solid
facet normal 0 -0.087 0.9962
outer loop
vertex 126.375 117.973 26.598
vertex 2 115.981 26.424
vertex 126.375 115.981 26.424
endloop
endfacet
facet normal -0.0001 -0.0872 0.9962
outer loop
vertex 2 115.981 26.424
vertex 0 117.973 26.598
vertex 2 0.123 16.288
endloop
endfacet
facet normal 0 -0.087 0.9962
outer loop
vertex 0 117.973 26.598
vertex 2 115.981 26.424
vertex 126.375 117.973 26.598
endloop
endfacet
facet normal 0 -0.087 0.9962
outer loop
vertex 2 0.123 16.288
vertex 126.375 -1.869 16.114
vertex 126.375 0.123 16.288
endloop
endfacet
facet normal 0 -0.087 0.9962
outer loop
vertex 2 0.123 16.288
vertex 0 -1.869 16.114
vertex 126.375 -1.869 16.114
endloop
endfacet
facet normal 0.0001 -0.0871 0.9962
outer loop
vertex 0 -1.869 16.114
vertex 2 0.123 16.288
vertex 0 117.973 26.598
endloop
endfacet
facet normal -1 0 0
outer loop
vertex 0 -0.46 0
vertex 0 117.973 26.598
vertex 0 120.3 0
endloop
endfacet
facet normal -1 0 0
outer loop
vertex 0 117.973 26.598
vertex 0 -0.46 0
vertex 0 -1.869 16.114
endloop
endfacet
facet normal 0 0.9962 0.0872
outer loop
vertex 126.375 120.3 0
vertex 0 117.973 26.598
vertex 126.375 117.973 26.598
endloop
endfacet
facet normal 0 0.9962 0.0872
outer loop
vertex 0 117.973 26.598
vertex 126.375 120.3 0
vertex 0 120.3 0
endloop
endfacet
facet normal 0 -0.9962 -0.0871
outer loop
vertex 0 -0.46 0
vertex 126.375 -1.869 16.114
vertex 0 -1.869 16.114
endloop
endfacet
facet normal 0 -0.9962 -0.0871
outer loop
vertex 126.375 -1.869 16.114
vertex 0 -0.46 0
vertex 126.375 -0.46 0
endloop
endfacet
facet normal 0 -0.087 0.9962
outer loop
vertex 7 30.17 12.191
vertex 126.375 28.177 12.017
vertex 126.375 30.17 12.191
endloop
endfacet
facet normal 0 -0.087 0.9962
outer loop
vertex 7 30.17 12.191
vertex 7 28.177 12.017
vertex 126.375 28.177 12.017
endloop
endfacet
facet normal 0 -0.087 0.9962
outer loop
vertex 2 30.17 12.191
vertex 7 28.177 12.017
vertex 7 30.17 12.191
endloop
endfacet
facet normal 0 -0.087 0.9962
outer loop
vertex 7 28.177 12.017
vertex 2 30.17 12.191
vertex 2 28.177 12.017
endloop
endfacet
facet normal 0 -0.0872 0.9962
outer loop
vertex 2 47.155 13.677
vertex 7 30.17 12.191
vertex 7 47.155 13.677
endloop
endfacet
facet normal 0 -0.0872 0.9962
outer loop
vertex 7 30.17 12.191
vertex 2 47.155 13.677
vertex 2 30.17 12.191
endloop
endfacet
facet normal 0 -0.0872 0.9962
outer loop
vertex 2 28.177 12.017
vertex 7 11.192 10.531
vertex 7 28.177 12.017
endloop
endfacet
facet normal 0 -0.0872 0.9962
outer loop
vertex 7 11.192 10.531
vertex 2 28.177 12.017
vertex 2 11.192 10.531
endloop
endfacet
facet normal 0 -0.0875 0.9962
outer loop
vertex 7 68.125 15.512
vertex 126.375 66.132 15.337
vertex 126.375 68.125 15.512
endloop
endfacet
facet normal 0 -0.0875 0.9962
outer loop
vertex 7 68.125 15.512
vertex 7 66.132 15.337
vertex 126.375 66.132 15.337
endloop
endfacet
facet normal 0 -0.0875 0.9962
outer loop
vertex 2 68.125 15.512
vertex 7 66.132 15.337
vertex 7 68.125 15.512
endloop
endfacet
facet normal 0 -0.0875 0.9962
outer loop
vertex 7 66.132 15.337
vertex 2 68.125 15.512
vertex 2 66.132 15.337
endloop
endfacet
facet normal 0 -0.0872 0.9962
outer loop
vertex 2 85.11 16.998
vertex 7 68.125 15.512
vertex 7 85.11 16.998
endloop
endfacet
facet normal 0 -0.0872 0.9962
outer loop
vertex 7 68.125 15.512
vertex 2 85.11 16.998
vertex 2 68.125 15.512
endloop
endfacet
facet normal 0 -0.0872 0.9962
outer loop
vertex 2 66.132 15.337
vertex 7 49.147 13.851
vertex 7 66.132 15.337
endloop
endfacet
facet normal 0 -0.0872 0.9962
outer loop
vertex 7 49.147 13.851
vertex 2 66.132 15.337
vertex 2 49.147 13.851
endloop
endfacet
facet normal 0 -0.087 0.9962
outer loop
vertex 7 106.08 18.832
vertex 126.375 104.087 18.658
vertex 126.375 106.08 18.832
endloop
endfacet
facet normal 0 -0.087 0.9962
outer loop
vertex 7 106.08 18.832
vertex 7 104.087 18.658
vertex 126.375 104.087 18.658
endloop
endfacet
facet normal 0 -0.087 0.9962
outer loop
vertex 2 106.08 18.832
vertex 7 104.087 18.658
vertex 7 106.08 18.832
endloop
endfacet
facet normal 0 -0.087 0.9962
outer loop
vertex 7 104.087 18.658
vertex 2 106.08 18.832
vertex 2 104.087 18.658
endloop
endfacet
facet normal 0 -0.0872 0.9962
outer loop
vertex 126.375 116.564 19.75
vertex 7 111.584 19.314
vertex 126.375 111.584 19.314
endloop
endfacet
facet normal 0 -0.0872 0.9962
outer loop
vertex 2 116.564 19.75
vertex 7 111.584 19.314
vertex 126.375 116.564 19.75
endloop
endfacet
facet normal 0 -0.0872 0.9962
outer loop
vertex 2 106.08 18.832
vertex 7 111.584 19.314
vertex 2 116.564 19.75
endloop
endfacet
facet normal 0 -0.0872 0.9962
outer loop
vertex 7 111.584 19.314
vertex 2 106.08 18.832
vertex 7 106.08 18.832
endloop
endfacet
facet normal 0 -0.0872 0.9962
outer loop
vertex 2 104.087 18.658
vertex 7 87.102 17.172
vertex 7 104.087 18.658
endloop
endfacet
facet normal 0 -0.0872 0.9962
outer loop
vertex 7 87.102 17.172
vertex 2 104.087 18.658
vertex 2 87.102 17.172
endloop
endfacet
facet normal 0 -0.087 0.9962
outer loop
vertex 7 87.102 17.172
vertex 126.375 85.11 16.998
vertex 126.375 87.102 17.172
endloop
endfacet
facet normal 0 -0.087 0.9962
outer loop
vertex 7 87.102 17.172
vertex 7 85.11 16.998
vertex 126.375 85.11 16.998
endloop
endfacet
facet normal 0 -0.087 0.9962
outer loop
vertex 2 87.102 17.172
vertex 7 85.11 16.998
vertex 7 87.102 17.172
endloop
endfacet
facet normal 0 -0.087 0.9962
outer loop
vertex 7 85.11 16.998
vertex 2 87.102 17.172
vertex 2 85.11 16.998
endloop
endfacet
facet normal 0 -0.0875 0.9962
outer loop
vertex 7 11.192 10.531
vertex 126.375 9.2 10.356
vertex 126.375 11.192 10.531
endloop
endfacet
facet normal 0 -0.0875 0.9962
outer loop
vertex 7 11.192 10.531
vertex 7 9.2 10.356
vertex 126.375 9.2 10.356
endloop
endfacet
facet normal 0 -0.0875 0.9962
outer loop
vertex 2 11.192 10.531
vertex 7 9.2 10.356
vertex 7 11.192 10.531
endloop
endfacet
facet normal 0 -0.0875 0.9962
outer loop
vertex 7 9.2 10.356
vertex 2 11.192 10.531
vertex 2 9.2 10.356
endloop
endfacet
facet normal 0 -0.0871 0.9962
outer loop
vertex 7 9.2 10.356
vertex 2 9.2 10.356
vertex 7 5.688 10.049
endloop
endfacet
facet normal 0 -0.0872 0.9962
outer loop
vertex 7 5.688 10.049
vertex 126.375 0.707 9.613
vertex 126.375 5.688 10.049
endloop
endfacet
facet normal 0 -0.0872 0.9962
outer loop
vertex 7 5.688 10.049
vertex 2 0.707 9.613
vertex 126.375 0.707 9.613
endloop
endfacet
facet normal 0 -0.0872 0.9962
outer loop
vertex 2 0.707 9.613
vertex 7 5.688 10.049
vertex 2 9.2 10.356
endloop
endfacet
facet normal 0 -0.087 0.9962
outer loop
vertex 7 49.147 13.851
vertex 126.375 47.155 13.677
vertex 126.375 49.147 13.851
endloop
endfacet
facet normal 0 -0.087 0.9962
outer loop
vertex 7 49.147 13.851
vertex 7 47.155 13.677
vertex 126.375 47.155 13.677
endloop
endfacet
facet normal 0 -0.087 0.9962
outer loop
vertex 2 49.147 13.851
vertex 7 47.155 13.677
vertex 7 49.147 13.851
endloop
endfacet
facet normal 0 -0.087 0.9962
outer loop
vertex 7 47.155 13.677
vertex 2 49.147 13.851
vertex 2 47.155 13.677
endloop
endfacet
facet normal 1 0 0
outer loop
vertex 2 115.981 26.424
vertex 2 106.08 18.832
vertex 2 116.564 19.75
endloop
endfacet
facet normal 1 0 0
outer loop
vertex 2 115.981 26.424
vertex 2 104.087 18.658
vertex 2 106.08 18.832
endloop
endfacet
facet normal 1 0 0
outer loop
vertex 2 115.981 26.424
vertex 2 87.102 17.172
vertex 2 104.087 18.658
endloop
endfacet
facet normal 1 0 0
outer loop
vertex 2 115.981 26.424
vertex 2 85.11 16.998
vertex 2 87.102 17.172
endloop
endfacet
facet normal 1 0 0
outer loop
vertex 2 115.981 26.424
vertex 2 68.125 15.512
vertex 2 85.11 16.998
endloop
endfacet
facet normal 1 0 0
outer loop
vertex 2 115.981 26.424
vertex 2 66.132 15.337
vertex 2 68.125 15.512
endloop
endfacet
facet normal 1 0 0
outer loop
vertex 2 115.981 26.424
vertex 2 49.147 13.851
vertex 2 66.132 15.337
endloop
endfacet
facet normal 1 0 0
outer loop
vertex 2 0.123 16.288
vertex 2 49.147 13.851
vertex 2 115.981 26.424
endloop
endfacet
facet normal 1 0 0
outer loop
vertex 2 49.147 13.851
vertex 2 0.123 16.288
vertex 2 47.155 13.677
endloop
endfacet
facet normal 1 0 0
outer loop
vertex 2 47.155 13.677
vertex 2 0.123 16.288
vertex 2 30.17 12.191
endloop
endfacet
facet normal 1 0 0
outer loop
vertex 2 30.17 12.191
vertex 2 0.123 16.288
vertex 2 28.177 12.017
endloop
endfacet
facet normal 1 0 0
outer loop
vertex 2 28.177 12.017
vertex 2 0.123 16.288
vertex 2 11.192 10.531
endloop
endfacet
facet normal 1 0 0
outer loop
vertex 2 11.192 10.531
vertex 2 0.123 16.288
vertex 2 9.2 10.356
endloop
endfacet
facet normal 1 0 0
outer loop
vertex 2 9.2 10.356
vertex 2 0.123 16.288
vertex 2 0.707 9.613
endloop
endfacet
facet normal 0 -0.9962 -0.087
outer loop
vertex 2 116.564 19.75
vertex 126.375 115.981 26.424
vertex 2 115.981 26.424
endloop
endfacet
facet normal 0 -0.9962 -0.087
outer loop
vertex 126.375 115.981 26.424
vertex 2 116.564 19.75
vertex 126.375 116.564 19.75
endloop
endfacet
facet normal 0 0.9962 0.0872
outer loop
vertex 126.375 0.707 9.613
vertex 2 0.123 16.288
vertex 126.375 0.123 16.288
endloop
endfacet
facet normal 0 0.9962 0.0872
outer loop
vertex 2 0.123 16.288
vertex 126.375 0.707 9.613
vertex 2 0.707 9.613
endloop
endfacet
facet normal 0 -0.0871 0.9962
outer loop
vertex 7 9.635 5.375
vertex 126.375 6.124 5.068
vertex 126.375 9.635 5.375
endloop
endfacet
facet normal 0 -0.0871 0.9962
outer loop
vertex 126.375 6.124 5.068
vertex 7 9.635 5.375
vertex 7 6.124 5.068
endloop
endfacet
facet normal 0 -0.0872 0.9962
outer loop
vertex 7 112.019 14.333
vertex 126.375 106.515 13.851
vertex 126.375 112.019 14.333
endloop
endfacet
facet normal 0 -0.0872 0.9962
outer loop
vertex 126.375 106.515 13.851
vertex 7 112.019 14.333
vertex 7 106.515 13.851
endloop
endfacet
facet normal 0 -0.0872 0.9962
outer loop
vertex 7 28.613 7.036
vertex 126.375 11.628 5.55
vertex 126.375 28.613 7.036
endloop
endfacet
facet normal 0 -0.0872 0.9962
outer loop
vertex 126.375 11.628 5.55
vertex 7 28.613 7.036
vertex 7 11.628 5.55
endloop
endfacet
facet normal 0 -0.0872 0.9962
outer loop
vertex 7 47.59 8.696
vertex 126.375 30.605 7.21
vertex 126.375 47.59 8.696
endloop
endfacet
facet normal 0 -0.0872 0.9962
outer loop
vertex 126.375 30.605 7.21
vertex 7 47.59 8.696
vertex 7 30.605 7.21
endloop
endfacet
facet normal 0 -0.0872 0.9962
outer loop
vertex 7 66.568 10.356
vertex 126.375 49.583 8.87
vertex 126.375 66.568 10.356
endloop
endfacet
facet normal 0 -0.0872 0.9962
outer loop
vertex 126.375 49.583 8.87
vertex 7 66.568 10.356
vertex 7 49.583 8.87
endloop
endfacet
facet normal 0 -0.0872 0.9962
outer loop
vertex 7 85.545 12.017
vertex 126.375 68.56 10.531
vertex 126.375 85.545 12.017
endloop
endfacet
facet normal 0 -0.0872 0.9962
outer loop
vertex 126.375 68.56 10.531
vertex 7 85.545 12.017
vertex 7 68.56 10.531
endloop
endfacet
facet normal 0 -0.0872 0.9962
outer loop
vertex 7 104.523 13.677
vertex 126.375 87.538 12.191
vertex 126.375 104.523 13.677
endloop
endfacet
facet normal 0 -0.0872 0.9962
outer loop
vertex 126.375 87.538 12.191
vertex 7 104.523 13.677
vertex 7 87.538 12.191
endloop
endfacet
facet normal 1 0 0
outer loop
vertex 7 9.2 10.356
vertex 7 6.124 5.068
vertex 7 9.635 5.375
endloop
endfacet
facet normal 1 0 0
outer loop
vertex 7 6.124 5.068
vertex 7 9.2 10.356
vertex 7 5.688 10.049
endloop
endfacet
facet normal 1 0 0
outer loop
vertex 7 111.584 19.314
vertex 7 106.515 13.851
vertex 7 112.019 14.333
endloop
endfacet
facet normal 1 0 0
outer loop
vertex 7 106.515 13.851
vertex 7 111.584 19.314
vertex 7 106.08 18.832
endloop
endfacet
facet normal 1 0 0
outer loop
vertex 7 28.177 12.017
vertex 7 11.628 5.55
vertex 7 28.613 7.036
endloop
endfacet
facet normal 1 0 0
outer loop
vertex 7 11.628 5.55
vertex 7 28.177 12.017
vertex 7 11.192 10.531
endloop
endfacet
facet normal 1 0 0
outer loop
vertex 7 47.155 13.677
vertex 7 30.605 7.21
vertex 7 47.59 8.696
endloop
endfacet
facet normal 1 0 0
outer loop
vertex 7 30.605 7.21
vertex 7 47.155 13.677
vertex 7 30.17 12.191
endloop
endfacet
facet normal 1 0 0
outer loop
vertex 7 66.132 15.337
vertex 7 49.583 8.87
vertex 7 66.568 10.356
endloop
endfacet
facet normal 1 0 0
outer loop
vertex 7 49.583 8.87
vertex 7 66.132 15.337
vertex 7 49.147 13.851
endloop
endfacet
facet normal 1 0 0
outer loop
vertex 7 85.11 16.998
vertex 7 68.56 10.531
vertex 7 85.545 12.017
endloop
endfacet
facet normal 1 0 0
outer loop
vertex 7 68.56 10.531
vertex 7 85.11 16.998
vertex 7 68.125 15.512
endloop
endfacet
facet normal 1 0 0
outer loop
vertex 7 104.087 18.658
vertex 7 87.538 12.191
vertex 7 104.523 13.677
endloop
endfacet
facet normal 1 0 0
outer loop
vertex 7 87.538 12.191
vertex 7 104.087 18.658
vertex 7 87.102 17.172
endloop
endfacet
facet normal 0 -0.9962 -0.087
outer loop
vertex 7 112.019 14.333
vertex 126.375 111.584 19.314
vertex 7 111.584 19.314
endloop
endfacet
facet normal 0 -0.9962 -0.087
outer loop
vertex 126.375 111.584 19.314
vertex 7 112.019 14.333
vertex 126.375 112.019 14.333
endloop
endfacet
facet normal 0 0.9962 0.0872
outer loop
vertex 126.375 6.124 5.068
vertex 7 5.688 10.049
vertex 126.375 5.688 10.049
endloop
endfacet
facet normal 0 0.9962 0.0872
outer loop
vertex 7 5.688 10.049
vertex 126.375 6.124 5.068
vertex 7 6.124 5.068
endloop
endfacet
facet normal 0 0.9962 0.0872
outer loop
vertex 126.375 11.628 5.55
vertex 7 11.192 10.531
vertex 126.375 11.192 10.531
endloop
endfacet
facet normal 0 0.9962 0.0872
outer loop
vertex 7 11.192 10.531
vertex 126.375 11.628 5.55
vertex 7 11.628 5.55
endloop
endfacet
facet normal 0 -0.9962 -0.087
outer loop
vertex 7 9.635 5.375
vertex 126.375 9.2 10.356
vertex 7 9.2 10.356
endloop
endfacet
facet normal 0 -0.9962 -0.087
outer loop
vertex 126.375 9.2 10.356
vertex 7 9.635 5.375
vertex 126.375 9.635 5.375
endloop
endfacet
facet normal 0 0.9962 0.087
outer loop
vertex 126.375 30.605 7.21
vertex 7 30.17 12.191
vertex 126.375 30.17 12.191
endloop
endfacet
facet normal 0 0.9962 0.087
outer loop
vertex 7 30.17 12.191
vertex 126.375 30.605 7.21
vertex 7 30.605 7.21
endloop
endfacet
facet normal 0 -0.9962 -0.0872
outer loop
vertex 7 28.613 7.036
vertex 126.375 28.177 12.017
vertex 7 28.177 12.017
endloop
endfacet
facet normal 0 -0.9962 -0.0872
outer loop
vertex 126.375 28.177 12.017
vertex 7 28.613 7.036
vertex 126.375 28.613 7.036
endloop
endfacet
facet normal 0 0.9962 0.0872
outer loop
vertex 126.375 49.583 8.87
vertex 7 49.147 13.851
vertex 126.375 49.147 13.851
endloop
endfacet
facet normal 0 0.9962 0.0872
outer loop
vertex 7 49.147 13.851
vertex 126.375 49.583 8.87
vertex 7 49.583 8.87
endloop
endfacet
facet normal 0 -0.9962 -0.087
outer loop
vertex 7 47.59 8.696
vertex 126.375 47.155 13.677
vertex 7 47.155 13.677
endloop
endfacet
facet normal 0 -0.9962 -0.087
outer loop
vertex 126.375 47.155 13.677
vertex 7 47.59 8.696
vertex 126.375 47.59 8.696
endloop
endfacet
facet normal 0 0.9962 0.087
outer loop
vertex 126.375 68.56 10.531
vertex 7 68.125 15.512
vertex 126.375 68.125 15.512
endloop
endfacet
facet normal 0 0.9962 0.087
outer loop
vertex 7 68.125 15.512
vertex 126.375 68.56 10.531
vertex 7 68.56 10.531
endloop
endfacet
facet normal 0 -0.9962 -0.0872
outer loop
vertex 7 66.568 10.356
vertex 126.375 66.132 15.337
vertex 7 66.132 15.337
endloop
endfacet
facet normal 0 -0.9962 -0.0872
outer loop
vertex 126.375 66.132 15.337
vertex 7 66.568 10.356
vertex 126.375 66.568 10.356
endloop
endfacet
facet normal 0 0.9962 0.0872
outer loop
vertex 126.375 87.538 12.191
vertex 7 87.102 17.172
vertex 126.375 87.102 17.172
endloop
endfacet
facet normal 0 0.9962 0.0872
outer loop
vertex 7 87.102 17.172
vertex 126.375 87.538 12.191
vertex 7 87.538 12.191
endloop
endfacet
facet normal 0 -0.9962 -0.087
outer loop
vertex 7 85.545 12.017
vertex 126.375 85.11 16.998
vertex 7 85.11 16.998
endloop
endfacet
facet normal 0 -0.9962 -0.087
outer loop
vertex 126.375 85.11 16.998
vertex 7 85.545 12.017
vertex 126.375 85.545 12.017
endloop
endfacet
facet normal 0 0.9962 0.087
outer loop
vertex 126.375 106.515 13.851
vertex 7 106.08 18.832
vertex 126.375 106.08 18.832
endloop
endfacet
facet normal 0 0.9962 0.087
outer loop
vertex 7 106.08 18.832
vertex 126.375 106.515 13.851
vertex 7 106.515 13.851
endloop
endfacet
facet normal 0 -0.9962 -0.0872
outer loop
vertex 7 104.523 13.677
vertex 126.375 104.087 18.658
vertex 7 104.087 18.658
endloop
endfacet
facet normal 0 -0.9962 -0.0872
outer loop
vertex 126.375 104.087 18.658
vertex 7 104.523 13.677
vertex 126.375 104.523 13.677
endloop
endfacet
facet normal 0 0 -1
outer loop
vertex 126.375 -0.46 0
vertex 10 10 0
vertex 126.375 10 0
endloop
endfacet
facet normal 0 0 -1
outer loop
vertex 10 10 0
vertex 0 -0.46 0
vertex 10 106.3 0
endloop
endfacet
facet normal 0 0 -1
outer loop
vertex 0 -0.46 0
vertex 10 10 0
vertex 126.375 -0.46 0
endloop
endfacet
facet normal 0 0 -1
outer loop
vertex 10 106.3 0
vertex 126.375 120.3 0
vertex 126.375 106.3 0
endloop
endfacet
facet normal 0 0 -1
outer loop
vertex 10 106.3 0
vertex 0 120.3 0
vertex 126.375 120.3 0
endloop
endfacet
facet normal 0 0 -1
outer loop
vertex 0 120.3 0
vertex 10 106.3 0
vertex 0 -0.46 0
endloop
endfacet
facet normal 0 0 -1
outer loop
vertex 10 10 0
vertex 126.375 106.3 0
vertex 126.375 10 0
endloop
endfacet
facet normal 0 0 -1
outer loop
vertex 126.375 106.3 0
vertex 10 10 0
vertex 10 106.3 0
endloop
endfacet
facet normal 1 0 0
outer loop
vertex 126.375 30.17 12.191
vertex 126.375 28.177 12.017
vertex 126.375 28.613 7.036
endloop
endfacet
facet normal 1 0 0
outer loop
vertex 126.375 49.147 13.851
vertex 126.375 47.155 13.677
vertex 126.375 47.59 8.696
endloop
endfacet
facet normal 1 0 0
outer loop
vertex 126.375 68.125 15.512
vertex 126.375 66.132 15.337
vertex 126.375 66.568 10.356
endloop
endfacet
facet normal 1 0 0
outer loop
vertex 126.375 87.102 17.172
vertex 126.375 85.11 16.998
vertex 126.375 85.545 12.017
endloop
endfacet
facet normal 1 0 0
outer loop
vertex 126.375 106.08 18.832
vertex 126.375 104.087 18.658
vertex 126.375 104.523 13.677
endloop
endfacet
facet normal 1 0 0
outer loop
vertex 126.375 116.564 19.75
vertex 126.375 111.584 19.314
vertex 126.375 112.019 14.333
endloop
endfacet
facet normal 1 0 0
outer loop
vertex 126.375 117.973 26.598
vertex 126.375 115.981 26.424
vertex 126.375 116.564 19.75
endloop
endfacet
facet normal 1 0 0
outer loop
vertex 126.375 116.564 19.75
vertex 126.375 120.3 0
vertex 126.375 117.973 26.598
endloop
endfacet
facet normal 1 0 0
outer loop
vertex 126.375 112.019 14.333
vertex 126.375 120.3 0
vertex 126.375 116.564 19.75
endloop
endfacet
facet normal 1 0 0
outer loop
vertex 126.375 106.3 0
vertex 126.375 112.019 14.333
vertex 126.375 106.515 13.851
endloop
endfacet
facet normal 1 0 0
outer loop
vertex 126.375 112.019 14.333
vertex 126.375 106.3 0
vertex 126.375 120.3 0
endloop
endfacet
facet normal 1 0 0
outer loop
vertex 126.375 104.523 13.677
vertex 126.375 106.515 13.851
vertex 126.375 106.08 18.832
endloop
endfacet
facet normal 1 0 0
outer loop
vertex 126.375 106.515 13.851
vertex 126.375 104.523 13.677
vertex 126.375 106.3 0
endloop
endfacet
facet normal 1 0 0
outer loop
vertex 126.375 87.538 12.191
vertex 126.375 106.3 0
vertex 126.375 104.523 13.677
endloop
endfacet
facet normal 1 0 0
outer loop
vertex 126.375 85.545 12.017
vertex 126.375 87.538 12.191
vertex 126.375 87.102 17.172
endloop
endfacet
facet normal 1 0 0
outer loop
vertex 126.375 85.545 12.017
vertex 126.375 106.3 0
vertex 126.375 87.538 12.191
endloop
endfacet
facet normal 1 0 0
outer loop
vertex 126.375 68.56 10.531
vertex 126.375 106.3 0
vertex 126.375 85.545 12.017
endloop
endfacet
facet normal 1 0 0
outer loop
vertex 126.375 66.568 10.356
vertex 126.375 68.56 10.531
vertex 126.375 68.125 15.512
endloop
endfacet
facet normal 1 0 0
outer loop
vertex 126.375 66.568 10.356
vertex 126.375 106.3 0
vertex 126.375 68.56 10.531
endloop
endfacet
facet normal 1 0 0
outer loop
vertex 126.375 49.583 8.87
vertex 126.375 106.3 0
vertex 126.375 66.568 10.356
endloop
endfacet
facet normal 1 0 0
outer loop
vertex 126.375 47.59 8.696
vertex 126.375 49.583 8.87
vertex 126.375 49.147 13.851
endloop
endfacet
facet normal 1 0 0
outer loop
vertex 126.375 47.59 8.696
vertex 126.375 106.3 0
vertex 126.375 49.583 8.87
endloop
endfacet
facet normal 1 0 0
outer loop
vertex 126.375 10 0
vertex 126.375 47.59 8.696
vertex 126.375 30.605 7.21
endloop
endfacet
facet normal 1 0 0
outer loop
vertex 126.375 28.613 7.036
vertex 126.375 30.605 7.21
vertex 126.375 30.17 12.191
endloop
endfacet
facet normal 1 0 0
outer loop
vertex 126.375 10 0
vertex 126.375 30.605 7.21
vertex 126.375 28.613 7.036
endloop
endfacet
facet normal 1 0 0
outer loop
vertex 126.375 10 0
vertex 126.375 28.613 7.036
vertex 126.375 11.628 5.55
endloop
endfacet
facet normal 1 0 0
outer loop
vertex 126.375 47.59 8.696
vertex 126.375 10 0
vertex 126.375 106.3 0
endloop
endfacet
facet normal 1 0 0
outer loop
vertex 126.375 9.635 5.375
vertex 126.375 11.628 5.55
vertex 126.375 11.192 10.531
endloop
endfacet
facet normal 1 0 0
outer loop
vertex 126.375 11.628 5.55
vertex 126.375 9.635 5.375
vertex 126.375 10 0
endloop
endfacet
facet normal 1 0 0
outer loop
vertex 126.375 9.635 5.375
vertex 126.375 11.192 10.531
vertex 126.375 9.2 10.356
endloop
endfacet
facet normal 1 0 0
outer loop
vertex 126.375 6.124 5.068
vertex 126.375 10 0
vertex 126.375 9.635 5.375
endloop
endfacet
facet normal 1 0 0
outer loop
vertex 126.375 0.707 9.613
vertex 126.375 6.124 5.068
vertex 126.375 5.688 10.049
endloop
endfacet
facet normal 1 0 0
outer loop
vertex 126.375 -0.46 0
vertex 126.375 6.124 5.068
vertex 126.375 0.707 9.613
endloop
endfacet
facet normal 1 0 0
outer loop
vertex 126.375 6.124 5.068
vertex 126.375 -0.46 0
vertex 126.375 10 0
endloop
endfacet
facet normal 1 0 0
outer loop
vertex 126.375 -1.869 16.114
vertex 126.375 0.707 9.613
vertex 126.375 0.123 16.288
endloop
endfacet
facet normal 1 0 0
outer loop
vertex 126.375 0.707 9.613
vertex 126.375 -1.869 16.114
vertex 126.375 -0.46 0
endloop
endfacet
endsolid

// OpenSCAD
pcb_width = 287.75; // 185.750 mm (Set a bit larger than real PCB size.)
pcb_height = 116.3; // 114.300 mm
exact_pcb_height = 114.300;
pcb_depth = 1.7; // 1.6 mm
pcb_edge_case_thickness = 2;
pcb_edge_support_thickness = 5;
pcb_buttom_gap = 5;
cherry_mx_plate_distance = 5;
pcb_hole_depth = pcb_depth + cherry_mx_plate_distance;
support_cube_thickness = 2;
support_line_locations = [for (i = [1, 3, 5, 7, 9, 11]) exact_pcb_height / 12 * i];
arduino_center_location_x = pcb_width / 2;
arduino_width = 23; // 18.37 mm
arduino_height = 57; // 57 mm (including area between top of arduino and pcb edge, and area having 2 diodes just under arduino that collide with a support line)
arduino_depth = 15;
arduino_usb_connector_width = 18; // Giving confortable space for the cable connector width.
toggle_switch_hole_width = 40.1; // 38.1 mm
toggle_switch_hole_height = 21.05; // 19.05 mm
toggle_switch_hole_depth = 17;
case_depth = pcb_hole_depth + max(arduino_depth, toggle_switch_hole_depth) + 3; // As small as possible without any hole on the buttom of the case. Includes inclunation effect.
text_depth = 1;
text_side_gap = 2;
text_top_gap = 2;
pcb_offset_x = 39.24;
pcb_offset_y = -31.625 - exact_pcb_height;
pcb_offset_z = 0;
inclination = 5;

case_width = 2 * pcb_edge_case_thickness + pcb_width;
case_height = 2 * pcb_edge_case_thickness + pcb_height;

display_pcb = false;
//prepare_for_3d_printing = true;
part = 1; // printing in 2 pieces due to big size, part 1 and 2.

module orthogonal_case() {
     difference() {
	  
	  // Case
	  cube([case_width, case_height, case_depth]);
	  
	  // PCB hole
	  translate([pcb_edge_case_thickness,
		     pcb_edge_case_thickness,
		     case_depth - pcb_hole_depth])          
	       cube([pcb_width, pcb_height,
		     pcb_hole_depth + 10]);
	  
	  // PCB buttom gap
	  translate([pcb_edge_case_thickness + pcb_edge_support_thickness,
		     pcb_edge_case_thickness + pcb_edge_support_thickness,
		     case_depth - pcb_hole_depth - pcb_buttom_gap])
	       cube([pcb_width - 2 * pcb_edge_support_thickness,
		     pcb_height - 2 * pcb_edge_support_thickness,
		     pcb_hole_depth + pcb_buttom_gap + 10]);

	  // Text engraving
	  translate([case_width - text_side_gap,
		     case_height - text_depth,
		     case_depth - text_top_gap])
	  rotate([90, 0, 180])
	       linear_extrude(height = 10)
	       text("Can Ortholinear Keyboard", valign="top", size=8);
     };
     
     // PCB support lines
     y_start = pcb_edge_case_thickness - support_cube_thickness / 2;
     y_list = [for (a = support_line_locations) a + y_start];
     for (y = y_list)
	  translate([pcb_edge_case_thickness,y,
		     case_depth - pcb_hole_depth - pcb_buttom_gap])
	       cube([pcb_width, support_cube_thickness, pcb_buttom_gap]);
}

module orthogonal_case_with_extra_holes_and_pcb() {
     difference() {
	  orthogonal_case();

	  // Arduino hole
	  translate([arduino_center_location_x - arduino_width / 2,
		     pcb_edge_case_thickness + pcb_height - arduino_height,
		     case_depth - pcb_hole_depth - arduino_depth])
	       cube([arduino_width,arduino_height,arduino_depth + pcb_depth + pcb_hole_depth + 10]);

	  // Arduino USB connector hole
	  translate([arduino_center_location_x - arduino_usb_connector_width / 2,
		     pcb_edge_case_thickness + pcb_height - 10,
		     case_depth - pcb_hole_depth - arduino_depth])
	       cube([arduino_usb_connector_width,pcb_edge_case_thickness + 20,arduino_depth]);
     
	  // Toggle switch hole
	  translate([pcb_edge_case_thickness + pcb_width - toggle_switch_hole_width,
		     pcb_edge_case_thickness + pcb_height - toggle_switch_hole_height,
		     case_depth - pcb_hole_depth - toggle_switch_hole_depth])
	       cube([toggle_switch_hole_width, toggle_switch_hole_height, toggle_switch_hole_depth + 10]);
     };

     // PCB
     if (display_pcb)
	  translate([pcb_edge_case_thickness, pcb_edge_case_thickness, case_depth - pcb_hole_depth])
	       translate([-pcb_offset_x + 1, -pcb_offset_y + 1, pcb_offset_z])
	       import("can-ortholinear-keyboard-pcb.stl");
}

// Inclination
module case_with_inclination() {
     translate([0, case_height, 0])
	  difference() {
	  rotate([inclination, 0, 0])
	       translate([0, -case_height, 0])
	       orthogonal_case_with_extra_holes_and_pcb();
	  
	  translate([-10, -case_height - 10, -80])
	       cube([case_width + 20, case_height + 20, 80]);
     };

     // Cover arduino hole opening from buttom.
     translate([10, 10, 0])
	  cube([pcb_width - 20, pcb_height - 20, 1.5]);
}

if (part == 1) {
     difference() {
	  case_with_inclination();
	  translate([case_width / 2 - arduino_width / 2 - 8, -5, -1]) cube([case_width + 5, case_height + 10, case_depth + 5]);
     }
} else {
     difference() {
	  case_with_inclination();
	  translate([case_width / 2 - arduino_width / 2 - 8 - (case_width + 5), -5, -1]) cube([case_width + 5, case_height + 10, case_depth + 5]);
     }
}

// Prepare for 3d printing.
// Revert inclination and center
// if (prepare_for_3d_printing)
//      translate([-case_width / 2, -case_height / 2, 0])
// 	  translate([0, case_height, 0])
// 	  rotate([-inclination, 0, 0])
// 	  translate([0, -case_height, 0])
// 	  case_with_inclination();
// else
//      case_with_inclination();
